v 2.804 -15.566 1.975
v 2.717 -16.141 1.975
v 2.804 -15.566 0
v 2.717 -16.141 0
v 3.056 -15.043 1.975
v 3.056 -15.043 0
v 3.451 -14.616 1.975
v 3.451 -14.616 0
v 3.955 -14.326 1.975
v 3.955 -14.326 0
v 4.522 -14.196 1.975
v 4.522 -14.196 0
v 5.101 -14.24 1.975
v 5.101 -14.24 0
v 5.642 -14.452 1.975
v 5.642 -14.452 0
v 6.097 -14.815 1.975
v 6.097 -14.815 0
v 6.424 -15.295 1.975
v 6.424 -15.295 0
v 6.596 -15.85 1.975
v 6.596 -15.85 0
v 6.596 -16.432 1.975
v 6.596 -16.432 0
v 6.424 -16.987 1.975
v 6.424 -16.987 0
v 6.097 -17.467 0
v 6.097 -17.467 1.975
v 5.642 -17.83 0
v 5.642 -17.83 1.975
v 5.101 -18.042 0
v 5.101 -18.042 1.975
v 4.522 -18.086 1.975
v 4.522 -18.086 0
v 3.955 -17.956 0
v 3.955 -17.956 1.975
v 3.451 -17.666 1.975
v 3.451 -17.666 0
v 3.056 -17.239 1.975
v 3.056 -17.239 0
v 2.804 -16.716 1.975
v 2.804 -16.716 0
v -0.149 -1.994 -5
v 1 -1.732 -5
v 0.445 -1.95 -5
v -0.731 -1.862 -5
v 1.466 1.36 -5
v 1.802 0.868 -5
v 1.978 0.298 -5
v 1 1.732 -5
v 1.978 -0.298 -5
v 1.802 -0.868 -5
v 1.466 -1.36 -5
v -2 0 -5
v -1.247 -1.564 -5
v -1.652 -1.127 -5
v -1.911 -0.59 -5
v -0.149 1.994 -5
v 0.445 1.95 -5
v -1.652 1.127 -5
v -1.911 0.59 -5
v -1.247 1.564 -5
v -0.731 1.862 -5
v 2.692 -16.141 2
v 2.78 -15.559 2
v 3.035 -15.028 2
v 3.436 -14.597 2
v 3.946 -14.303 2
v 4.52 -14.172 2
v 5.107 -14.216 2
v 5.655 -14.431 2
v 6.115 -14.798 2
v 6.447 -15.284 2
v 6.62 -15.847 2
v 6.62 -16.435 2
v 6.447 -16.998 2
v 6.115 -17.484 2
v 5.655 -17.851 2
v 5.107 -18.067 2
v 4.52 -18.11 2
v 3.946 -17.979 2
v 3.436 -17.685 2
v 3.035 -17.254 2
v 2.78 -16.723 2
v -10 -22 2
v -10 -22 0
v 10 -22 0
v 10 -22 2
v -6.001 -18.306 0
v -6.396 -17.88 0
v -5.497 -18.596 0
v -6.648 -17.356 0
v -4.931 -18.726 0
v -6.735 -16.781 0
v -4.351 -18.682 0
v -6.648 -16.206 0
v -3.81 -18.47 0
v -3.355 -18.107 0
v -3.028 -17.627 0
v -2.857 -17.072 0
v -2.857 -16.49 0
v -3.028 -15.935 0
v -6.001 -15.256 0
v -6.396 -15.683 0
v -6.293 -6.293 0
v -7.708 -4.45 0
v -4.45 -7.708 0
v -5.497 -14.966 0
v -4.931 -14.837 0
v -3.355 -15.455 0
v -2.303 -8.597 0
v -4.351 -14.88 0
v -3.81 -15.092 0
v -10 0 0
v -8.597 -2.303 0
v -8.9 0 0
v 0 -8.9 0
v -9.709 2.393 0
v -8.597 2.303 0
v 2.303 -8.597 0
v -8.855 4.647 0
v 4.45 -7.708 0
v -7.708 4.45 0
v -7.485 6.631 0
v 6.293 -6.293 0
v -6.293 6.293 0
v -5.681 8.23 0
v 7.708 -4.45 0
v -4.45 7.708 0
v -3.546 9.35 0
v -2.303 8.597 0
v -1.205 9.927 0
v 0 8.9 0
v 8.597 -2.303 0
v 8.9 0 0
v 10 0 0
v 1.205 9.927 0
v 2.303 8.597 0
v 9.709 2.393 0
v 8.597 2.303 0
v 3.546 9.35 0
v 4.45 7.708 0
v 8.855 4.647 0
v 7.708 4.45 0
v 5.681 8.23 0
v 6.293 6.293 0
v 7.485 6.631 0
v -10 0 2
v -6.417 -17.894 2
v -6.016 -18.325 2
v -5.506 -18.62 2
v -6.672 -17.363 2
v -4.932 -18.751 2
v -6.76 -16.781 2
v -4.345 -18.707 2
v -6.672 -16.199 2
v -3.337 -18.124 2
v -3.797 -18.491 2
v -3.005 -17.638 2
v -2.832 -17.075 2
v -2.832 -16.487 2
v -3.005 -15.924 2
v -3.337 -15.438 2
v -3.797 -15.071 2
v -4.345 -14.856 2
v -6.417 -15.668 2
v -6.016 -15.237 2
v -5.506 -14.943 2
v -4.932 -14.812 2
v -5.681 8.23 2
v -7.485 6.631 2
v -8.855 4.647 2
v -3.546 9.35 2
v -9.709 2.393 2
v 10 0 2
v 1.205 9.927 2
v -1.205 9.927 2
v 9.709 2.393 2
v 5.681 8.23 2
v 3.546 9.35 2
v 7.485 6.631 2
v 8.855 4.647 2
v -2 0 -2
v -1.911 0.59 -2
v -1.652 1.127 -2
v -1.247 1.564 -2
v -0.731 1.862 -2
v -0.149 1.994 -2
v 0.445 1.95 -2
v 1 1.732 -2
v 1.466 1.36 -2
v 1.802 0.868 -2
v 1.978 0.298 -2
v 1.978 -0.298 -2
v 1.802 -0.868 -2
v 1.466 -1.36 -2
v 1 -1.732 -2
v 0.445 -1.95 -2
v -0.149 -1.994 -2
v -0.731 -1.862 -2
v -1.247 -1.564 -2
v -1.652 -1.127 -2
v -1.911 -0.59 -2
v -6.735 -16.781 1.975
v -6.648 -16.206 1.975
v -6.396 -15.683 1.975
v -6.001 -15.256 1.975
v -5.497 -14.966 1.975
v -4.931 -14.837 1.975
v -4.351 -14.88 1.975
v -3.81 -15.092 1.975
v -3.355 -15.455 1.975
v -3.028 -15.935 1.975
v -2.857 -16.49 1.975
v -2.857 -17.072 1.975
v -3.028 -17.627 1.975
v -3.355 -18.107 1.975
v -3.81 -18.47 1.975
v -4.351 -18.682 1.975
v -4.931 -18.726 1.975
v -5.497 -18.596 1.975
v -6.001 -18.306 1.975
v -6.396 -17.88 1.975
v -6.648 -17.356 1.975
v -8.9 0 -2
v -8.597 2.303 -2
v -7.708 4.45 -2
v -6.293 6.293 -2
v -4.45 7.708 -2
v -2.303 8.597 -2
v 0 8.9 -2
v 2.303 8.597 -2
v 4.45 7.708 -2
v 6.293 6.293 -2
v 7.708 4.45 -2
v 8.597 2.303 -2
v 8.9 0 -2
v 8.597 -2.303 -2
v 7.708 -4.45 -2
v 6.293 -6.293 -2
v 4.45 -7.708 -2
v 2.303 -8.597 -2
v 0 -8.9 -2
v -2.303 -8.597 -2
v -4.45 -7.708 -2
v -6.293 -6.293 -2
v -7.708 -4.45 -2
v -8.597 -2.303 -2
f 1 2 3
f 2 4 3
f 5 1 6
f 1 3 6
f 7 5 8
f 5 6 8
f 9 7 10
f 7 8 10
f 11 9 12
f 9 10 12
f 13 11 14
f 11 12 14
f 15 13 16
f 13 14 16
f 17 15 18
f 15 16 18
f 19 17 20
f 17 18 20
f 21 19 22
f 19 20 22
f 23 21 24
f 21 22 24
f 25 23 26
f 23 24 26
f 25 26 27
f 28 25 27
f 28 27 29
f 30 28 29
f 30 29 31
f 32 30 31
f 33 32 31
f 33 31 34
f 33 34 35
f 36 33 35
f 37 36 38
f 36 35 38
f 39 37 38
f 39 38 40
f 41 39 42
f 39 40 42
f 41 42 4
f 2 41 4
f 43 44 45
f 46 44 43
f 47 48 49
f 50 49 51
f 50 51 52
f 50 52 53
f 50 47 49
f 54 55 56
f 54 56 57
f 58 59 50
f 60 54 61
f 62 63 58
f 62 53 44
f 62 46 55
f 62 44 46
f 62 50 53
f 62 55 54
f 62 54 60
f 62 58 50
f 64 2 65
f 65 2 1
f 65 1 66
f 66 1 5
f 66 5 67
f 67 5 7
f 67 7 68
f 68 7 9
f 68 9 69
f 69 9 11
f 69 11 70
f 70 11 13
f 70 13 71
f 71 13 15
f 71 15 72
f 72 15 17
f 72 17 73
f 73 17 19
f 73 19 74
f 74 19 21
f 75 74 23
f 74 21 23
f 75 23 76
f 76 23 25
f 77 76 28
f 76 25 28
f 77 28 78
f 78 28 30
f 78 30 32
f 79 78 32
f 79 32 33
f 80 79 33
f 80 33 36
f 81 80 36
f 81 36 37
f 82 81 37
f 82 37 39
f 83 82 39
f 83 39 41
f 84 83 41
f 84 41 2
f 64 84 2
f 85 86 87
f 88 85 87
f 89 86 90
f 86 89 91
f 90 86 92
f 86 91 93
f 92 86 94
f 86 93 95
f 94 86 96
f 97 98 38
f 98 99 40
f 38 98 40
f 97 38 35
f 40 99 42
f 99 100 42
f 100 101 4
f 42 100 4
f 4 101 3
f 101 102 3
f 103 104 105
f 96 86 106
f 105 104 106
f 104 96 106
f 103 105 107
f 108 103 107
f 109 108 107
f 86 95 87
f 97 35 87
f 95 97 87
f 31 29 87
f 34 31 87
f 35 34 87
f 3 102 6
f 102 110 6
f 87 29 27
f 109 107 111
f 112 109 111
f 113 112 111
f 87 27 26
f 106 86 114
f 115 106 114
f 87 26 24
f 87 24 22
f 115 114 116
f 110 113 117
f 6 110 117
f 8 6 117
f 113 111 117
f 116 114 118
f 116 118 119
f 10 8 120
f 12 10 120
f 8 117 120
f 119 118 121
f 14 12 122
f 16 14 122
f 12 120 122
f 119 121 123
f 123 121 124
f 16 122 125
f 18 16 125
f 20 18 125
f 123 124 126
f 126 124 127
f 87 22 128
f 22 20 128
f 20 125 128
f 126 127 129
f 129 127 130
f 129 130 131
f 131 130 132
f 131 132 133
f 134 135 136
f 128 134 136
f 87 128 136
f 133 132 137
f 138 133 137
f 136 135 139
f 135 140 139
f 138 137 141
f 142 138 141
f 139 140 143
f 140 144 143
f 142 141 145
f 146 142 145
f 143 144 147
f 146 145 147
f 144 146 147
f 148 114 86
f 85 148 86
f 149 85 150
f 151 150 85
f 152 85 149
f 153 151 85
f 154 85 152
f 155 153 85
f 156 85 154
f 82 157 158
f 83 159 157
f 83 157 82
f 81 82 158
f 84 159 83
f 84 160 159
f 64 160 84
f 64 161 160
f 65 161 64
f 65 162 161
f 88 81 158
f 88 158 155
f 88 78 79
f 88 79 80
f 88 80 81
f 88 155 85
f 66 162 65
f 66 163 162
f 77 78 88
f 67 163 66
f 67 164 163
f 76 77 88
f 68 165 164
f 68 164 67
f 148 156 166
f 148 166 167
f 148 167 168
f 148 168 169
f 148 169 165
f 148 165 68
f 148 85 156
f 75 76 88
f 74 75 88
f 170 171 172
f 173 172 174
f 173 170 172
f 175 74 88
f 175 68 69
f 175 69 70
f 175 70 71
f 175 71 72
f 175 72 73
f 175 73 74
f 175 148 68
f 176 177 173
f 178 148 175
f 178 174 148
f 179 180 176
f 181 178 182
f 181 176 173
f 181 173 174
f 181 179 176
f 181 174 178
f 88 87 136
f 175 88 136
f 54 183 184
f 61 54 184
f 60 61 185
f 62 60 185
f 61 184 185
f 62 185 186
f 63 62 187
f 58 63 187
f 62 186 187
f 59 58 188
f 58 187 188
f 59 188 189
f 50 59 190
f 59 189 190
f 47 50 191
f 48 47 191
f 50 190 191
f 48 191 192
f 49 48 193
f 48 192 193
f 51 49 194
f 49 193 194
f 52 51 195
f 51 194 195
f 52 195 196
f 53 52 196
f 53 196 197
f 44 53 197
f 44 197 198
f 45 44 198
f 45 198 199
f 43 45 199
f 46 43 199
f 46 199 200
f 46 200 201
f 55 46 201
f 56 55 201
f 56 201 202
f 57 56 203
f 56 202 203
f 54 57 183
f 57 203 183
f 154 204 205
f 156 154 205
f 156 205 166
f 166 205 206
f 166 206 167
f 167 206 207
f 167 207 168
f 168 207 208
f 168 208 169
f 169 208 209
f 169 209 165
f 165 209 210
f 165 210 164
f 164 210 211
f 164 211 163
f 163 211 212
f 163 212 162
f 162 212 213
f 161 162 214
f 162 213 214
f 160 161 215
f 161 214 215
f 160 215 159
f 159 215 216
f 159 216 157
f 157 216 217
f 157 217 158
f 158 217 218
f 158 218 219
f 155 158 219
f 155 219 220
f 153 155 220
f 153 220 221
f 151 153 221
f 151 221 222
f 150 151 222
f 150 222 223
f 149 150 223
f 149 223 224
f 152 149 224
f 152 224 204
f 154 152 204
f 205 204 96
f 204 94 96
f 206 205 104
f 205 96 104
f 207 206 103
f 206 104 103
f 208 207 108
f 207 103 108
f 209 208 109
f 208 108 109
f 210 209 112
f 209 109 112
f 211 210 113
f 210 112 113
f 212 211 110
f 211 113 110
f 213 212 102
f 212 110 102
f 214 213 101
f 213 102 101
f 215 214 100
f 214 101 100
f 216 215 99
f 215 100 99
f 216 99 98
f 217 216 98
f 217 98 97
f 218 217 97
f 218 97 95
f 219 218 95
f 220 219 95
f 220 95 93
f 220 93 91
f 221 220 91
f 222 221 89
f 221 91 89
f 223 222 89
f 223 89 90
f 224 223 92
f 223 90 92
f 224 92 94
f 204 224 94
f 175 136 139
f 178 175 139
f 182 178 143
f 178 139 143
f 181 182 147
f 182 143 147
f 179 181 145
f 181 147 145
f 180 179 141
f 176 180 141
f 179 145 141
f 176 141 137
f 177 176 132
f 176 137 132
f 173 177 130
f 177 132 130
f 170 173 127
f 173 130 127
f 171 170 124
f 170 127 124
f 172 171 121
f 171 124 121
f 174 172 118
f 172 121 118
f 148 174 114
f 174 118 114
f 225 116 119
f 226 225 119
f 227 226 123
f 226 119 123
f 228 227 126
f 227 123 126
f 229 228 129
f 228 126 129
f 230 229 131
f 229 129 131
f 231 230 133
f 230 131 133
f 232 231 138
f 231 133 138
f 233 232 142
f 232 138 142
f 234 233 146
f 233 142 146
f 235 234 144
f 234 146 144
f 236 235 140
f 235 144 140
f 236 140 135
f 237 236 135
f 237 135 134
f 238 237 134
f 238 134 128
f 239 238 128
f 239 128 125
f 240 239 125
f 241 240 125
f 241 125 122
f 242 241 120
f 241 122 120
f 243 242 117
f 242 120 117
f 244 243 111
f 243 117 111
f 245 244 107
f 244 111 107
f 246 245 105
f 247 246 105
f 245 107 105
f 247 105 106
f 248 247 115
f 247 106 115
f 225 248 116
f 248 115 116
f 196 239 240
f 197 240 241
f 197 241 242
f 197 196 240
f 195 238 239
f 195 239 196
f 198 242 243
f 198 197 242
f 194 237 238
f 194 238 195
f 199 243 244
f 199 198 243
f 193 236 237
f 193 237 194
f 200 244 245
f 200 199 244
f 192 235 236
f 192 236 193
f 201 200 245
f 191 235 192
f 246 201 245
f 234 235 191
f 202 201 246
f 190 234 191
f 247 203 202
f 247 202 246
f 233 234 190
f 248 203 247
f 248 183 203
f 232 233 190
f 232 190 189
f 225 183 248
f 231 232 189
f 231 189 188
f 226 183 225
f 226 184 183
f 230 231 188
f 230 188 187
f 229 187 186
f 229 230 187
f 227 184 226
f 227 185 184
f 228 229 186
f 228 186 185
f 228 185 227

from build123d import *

# Parameters (mm, degrees)
BOSS_EXTRUDE1_DEPTH              = 2
SKETCH2_R                        = 8.9
BOSS_EXTRUDE2_DEPTH              = 2
SKETCH3_R                        = 2
BOSS_EXTRUDE3_DEPTH              = 3
M3_5_CLEARANCE_HOLE1_D           = 3.9
M3_5_CLEARANCE_HOLE1_CSINK_D     = 3.95
M3_5_CLEARANCE_HOLE1_CSINK_ANGLE = 90


with BuildPart() as part:
    # Sketch1 → Boss-Extrude1 (new body)
    with BuildSketch(Plane.XY):
        with BuildLine():
            Line((-10, 0), (-10, -22))
            Line((-10, -22), (10, -22))
            Line((10, -22), (10, 0))
            ThreePointArc((10, 0), (0, 10), (-10, 0))
        make_face()
    extrude(amount=BOSS_EXTRUDE1_DEPTH)

    # Sketch2 → Boss-Extrude2 (add)
    with BuildSketch(Plane(origin=(0, 0, 0), x_dir=(-1, 0, 0), z_dir=(0, 0, -1))):
        Circle(SKETCH2_R)
    extrude(amount=BOSS_EXTRUDE2_DEPTH)

    # Sketch3 → Boss-Extrude3 (add)
    with BuildSketch(Plane(origin=(0, 0, -2), x_dir=(-1, 0, 0), z_dir=(0, 0, -1))):
        Circle(SKETCH3_R)
    extrude(amount=BOSS_EXTRUDE3_DEPTH)

    # M3.5 Clearance Hole1 (through all)
    with Locations(Plane.XY.offset(2)):
        with Locations((-4.784779524, -16.781056018), (4.667291899, -16.141017378)):
            CounterSinkHole(M3_5_CLEARANCE_HOLE1_D / 2, M3_5_CLEARANCE_HOLE1_CSINK_D / 2, counter_sink_angle=M3_5_CLEARANCE_HOLE1_CSINK_ANGLE)


solid = part.part
